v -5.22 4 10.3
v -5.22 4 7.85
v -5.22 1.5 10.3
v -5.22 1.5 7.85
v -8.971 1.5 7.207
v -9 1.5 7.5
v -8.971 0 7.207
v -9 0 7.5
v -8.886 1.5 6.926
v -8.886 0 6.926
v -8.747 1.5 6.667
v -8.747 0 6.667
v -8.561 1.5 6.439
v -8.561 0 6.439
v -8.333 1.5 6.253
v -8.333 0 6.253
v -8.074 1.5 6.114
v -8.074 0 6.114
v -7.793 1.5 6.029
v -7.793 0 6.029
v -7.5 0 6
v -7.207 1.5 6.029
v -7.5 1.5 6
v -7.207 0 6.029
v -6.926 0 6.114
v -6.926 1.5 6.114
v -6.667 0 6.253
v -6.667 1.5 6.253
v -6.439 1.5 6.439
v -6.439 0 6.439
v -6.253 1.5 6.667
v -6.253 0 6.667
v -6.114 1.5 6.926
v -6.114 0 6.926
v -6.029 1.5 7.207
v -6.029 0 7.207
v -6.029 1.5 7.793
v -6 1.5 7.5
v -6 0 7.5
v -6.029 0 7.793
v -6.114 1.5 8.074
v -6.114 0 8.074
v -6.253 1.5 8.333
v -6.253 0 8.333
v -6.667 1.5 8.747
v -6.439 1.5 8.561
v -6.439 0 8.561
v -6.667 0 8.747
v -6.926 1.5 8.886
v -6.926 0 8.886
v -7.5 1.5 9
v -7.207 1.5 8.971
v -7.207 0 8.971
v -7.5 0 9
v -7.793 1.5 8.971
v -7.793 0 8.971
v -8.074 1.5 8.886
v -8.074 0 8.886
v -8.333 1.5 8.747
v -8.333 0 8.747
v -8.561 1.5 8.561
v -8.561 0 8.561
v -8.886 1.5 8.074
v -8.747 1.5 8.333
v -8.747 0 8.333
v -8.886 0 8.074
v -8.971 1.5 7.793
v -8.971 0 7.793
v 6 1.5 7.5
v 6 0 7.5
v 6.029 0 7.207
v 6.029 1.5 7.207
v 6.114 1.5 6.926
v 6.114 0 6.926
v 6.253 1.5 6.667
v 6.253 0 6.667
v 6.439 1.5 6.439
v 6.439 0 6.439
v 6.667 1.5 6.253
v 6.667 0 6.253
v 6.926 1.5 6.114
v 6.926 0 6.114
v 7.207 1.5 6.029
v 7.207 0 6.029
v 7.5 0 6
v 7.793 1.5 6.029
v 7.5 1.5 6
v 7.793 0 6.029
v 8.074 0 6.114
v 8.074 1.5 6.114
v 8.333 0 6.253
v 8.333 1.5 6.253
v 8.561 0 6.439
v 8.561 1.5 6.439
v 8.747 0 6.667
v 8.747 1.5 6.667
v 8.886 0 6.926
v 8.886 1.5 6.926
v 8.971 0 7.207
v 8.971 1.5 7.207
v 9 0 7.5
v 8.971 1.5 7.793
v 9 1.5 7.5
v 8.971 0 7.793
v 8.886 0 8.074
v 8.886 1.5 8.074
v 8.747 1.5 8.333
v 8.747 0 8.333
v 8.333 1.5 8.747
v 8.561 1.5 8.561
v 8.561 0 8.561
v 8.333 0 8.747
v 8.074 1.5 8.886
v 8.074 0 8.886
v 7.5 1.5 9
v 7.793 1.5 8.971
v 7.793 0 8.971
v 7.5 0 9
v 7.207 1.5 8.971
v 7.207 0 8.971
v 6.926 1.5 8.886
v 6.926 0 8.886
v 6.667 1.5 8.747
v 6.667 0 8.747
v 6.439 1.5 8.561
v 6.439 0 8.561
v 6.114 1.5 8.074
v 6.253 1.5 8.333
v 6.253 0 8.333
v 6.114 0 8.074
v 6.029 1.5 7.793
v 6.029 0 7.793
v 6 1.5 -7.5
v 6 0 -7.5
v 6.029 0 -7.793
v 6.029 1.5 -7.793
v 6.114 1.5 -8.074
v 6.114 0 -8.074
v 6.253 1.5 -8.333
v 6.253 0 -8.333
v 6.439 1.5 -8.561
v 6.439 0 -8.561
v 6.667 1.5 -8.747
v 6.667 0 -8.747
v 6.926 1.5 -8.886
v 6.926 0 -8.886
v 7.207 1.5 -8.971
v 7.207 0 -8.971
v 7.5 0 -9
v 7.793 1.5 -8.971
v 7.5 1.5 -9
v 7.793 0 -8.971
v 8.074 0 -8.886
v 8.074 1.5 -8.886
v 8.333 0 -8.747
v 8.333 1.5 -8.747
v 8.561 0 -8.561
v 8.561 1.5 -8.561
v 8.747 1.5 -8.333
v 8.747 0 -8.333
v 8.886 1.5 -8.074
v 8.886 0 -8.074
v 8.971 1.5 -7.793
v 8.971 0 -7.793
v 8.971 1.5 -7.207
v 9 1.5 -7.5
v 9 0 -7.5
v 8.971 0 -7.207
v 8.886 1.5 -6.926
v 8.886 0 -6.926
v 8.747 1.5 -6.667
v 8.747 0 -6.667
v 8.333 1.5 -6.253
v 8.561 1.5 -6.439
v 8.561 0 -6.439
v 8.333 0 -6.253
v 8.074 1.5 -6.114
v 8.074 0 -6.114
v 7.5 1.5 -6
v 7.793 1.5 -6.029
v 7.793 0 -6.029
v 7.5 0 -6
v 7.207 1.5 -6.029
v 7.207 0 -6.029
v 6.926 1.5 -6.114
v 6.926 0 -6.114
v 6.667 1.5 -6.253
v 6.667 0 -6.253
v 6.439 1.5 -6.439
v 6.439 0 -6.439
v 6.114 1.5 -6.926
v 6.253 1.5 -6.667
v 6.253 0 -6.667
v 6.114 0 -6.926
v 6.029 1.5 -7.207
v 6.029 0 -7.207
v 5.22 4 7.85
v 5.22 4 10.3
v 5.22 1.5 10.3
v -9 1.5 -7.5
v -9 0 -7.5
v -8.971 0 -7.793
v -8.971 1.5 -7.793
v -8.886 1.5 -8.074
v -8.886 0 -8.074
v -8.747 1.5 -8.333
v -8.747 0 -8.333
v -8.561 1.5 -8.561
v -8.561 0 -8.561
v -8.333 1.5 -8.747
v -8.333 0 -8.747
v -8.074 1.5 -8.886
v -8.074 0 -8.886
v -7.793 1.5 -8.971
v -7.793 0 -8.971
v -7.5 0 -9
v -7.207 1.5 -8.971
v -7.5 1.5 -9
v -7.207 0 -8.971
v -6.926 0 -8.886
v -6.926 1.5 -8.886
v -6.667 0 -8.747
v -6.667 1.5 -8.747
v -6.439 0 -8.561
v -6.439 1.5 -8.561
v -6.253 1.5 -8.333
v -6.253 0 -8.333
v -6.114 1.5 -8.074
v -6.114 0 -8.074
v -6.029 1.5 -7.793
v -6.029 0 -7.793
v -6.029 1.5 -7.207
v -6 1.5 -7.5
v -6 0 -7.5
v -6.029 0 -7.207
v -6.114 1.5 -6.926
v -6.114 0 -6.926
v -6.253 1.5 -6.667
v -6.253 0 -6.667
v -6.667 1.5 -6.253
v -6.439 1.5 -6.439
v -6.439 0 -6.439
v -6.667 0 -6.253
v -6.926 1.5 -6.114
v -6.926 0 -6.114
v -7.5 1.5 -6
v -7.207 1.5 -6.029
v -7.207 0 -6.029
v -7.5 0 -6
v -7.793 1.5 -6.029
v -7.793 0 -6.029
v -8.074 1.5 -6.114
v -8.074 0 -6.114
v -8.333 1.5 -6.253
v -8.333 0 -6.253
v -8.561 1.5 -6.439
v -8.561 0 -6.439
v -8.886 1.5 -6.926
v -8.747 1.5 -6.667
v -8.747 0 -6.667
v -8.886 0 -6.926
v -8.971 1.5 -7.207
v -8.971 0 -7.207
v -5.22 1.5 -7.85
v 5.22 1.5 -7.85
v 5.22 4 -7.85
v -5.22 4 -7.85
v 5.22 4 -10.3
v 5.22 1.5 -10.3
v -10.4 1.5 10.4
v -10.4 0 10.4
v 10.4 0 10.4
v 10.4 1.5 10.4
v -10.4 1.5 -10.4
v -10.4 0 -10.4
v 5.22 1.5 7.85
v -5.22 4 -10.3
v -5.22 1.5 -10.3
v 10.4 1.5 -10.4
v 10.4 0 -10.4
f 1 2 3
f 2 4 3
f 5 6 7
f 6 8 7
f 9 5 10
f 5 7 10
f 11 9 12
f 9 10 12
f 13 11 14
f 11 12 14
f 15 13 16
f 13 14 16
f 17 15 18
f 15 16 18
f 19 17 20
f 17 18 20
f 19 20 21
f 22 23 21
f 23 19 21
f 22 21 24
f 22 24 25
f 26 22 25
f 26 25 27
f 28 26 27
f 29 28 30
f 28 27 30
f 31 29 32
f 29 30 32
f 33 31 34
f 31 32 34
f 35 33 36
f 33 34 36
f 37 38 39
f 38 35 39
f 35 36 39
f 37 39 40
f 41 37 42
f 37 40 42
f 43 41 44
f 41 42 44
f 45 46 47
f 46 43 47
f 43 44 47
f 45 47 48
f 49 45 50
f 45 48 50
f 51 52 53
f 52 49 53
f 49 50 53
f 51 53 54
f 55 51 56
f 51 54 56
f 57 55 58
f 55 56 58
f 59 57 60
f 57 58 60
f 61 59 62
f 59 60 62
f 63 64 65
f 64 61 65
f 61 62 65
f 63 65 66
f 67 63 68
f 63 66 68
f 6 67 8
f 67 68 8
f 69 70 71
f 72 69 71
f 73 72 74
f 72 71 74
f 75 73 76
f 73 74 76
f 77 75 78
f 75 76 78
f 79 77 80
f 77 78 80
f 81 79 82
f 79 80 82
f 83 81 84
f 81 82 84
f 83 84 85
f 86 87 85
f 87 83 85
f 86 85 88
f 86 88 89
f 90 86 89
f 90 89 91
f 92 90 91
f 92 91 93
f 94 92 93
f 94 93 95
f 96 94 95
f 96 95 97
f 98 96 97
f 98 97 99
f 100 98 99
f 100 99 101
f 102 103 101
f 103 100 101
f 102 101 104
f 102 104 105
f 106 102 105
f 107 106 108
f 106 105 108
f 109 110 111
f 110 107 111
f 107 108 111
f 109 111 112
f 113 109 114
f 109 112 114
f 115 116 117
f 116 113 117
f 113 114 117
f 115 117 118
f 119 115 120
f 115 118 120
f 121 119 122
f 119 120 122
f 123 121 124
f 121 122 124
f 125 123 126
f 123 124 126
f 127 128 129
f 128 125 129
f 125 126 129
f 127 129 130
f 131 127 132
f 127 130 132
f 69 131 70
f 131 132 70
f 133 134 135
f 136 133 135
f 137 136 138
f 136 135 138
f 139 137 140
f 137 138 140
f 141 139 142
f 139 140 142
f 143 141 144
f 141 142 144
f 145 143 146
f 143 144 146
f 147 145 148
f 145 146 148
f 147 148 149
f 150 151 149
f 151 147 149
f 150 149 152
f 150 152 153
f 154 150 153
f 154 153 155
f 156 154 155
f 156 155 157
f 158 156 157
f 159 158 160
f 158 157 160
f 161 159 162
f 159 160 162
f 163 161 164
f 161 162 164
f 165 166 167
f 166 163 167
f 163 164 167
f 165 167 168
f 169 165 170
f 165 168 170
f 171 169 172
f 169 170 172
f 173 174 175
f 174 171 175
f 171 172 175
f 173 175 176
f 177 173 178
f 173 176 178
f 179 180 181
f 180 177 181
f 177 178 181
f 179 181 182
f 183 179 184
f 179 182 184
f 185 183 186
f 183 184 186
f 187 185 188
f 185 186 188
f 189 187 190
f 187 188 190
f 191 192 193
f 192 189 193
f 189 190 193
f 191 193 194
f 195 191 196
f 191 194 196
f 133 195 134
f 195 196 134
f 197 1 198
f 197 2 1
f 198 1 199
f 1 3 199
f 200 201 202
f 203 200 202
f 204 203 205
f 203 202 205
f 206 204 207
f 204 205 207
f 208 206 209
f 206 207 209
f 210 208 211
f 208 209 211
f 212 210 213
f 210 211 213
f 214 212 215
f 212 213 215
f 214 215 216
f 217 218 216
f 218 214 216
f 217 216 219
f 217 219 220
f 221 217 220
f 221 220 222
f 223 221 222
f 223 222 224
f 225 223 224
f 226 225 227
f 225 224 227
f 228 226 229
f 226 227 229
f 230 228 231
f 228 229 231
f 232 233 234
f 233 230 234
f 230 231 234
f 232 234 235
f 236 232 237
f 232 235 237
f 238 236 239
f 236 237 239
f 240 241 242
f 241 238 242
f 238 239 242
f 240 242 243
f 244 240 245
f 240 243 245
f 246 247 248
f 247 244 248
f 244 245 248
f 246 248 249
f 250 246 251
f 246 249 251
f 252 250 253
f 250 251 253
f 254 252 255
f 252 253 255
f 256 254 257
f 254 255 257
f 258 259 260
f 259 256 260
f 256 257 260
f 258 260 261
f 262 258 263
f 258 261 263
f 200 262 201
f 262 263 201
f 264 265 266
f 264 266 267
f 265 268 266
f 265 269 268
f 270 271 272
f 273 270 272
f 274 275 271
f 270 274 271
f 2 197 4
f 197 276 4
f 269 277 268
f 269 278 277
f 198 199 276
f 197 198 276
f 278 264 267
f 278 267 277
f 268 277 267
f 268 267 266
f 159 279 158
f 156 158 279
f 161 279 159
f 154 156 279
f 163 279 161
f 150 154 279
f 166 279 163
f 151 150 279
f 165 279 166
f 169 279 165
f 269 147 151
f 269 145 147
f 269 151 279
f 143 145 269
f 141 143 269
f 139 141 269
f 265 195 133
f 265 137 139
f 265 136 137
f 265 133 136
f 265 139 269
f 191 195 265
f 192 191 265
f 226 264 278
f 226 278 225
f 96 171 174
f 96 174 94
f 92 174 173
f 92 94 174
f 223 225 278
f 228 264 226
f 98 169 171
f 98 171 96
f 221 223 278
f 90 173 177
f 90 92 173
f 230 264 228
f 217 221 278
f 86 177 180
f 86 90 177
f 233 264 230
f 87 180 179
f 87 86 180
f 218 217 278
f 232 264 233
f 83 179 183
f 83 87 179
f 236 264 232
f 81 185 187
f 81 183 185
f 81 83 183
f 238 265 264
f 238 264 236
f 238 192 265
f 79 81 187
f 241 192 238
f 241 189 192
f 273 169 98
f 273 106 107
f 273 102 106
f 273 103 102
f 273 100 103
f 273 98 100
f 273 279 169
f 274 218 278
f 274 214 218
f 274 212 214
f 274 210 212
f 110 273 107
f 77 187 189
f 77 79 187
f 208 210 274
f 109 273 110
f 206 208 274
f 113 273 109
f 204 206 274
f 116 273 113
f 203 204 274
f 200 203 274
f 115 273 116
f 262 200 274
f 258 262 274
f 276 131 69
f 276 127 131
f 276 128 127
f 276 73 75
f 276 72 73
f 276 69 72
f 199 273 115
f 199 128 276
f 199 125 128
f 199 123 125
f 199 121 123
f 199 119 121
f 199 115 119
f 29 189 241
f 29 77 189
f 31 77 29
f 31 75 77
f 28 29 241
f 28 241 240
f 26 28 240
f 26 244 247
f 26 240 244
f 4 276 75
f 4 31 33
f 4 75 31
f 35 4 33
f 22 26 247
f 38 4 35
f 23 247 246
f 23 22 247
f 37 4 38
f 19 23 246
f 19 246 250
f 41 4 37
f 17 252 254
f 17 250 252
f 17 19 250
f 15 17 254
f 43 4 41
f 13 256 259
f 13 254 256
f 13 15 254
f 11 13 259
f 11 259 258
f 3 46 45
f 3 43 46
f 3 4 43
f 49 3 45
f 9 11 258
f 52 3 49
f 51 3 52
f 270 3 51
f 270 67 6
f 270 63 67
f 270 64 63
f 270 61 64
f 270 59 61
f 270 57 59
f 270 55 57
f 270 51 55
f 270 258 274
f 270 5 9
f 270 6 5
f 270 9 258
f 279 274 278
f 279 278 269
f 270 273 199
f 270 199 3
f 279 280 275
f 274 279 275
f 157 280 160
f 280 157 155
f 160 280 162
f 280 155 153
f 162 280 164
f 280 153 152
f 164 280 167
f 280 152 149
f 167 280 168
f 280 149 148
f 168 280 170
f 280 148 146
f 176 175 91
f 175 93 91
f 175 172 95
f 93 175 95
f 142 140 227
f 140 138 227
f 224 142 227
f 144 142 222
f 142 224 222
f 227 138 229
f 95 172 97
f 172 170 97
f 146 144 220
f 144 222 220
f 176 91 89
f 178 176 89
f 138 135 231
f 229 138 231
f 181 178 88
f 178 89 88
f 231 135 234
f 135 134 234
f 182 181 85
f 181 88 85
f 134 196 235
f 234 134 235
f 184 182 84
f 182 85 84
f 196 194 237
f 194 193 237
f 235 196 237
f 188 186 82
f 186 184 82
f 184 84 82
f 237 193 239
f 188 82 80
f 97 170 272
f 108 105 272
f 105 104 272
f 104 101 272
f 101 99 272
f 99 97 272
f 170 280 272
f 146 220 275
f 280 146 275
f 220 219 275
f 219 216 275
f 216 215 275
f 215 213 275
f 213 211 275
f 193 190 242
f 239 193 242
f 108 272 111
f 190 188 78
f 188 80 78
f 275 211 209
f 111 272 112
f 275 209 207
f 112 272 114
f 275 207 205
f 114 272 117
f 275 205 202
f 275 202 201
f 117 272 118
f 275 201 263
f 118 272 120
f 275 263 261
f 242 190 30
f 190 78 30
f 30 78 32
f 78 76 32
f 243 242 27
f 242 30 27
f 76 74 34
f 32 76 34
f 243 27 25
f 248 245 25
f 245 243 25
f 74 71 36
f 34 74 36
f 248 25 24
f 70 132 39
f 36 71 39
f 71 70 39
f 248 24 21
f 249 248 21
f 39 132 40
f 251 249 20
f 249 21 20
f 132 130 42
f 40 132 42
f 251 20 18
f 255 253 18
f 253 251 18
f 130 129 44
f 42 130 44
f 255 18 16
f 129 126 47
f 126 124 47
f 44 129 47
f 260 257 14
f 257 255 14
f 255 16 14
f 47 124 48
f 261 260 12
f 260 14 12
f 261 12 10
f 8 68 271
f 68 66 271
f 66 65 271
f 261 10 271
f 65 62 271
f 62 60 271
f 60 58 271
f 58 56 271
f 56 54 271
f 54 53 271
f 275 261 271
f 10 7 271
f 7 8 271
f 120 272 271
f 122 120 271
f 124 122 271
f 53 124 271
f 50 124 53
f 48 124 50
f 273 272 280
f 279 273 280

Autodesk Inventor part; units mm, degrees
ref_plane "YZ Plane" through (0, 0, 0) normal (1, 0, 0) x (0, 1, 0)
ref_plane "XZ Plane" through (0, 0, 0) normal (0, 1, 0) x (-1, 0, 0)
ref_plane "XY Plane" through (0, 0, 0) normal (0, 0, 1) x (1, 0, 0)
sketch "Sketch1" plane through (0, 0, 0) normal (0, 1, 0) x (-1, 0, 0)
  line L0 (10.4, 10.4) -> (-10.4, 10.4)
  line L1 (-10.4, 10.4) -> (-10.4, -10.4)
  line L2 (-10.4, -10.4) -> (10.4, -10.4)
  line L3 (10.4, -10.4) -> (10.4, 10.4)
  line L4 (10.4, 10.4) -> (-10.4, -10.4) construction
  line L5 (-10.4, 10.4) -> (10.4, -10.4) construction
  line L6 (7.5, 7.5) -> (-7.5, 7.5) construction
  line L7 (-7.5, 7.5) -> (-7.5, -7.5) construction
  line L8 (-7.5, -7.5) -> (7.5, -7.5) construction
  line L9 (7.5, -7.5) -> (7.5, 7.5) construction
  line L10 (7.5, 7.5) -> (-7.5, -7.5) construction
  line L11 (-7.5, 7.5) -> (7.5, -7.5) construction
  circle A0 centre (7.5, -7.5) radius 1.5
  circle A1 centre (-7.5, -7.5) radius 1.5
  circle A2 centre (7.5, 7.5) radius 1.5
  circle A3 centre (-7.5, 7.5) radius 1.5
  point P0 (0, 0)
  dimension "d0" = 20.8
  dimension "d1" = 20.8
  dimension "d2" = 15
  dimension "d3" = 15
  dimension "d4" = 3
  dimension "d7" = 15
  dimension "d10" = 15
extrude "Extrusion1" add sketch "Sketch1" along normal blind 1.5
sketch "Sketch2" plane through (0, 1.5, 0) normal (0, 1, 0) x (1, 0, 0)
  line L0 (10.4, 10.4) -> (-10.4, 10.4) projected
  line L1 (0, 10.4) -> (0, -10.4) construction
  line L2 (-10.4, -10.4) -> (10.4, -10.4) projected
  line L3 (-5.22, 10.3) -> (5.22, 10.3)
  line L4 (5.22, 10.3) -> (5.22, 7.85)
  line L5 (5.22, 7.85) -> (-5.22, 7.85)
  line L6 (-5.22, 7.85) -> (-5.22, 10.3)
  line L7 (-5.22, 10.3) -> (5.22, 7.85) construction
  line L8 (5.22, 10.3) -> (-5.22, 7.85) construction
  line L9 (-10.4, 10.4) -> (-10.4, -10.4) projected
  line L10 (-10.4, 0) -> (10.4, 0) construction
  line L11 (10.4, -10.4) -> (10.4, 10.4) projected
  line L12 (-5.22, -10.3) -> (5.22, -10.3)
  line L13 (5.22, -10.3) -> (5.22, -7.85)
  line L14 (5.22, -7.85) -> (-5.22, -7.85)
  line L15 (-5.22, -7.85) -> (-5.22, -10.3)
  line L16 (-5.22, -10.3) -> (5.22, -7.85) construction
  line L17 (5.22, -10.3) -> (-5.22, -7.85) construction
  point P0 (0, 0)
  point P1 (0, 9.075)
  point P2 (0, -9.075)
  dimension "d15" = 10.44
  dimension "d16" = 2.45
  dimension "d17" = 0.1
extrude "Extrusion2" add sketch "Sketch2" along normal blind 2.5 contours L3 L4 L5 L6 | L15 L14 L13 L12
equation "\"d7\" = d2"
equation "\"d10\" = d2"
properties part number "H3LIS331DL"
